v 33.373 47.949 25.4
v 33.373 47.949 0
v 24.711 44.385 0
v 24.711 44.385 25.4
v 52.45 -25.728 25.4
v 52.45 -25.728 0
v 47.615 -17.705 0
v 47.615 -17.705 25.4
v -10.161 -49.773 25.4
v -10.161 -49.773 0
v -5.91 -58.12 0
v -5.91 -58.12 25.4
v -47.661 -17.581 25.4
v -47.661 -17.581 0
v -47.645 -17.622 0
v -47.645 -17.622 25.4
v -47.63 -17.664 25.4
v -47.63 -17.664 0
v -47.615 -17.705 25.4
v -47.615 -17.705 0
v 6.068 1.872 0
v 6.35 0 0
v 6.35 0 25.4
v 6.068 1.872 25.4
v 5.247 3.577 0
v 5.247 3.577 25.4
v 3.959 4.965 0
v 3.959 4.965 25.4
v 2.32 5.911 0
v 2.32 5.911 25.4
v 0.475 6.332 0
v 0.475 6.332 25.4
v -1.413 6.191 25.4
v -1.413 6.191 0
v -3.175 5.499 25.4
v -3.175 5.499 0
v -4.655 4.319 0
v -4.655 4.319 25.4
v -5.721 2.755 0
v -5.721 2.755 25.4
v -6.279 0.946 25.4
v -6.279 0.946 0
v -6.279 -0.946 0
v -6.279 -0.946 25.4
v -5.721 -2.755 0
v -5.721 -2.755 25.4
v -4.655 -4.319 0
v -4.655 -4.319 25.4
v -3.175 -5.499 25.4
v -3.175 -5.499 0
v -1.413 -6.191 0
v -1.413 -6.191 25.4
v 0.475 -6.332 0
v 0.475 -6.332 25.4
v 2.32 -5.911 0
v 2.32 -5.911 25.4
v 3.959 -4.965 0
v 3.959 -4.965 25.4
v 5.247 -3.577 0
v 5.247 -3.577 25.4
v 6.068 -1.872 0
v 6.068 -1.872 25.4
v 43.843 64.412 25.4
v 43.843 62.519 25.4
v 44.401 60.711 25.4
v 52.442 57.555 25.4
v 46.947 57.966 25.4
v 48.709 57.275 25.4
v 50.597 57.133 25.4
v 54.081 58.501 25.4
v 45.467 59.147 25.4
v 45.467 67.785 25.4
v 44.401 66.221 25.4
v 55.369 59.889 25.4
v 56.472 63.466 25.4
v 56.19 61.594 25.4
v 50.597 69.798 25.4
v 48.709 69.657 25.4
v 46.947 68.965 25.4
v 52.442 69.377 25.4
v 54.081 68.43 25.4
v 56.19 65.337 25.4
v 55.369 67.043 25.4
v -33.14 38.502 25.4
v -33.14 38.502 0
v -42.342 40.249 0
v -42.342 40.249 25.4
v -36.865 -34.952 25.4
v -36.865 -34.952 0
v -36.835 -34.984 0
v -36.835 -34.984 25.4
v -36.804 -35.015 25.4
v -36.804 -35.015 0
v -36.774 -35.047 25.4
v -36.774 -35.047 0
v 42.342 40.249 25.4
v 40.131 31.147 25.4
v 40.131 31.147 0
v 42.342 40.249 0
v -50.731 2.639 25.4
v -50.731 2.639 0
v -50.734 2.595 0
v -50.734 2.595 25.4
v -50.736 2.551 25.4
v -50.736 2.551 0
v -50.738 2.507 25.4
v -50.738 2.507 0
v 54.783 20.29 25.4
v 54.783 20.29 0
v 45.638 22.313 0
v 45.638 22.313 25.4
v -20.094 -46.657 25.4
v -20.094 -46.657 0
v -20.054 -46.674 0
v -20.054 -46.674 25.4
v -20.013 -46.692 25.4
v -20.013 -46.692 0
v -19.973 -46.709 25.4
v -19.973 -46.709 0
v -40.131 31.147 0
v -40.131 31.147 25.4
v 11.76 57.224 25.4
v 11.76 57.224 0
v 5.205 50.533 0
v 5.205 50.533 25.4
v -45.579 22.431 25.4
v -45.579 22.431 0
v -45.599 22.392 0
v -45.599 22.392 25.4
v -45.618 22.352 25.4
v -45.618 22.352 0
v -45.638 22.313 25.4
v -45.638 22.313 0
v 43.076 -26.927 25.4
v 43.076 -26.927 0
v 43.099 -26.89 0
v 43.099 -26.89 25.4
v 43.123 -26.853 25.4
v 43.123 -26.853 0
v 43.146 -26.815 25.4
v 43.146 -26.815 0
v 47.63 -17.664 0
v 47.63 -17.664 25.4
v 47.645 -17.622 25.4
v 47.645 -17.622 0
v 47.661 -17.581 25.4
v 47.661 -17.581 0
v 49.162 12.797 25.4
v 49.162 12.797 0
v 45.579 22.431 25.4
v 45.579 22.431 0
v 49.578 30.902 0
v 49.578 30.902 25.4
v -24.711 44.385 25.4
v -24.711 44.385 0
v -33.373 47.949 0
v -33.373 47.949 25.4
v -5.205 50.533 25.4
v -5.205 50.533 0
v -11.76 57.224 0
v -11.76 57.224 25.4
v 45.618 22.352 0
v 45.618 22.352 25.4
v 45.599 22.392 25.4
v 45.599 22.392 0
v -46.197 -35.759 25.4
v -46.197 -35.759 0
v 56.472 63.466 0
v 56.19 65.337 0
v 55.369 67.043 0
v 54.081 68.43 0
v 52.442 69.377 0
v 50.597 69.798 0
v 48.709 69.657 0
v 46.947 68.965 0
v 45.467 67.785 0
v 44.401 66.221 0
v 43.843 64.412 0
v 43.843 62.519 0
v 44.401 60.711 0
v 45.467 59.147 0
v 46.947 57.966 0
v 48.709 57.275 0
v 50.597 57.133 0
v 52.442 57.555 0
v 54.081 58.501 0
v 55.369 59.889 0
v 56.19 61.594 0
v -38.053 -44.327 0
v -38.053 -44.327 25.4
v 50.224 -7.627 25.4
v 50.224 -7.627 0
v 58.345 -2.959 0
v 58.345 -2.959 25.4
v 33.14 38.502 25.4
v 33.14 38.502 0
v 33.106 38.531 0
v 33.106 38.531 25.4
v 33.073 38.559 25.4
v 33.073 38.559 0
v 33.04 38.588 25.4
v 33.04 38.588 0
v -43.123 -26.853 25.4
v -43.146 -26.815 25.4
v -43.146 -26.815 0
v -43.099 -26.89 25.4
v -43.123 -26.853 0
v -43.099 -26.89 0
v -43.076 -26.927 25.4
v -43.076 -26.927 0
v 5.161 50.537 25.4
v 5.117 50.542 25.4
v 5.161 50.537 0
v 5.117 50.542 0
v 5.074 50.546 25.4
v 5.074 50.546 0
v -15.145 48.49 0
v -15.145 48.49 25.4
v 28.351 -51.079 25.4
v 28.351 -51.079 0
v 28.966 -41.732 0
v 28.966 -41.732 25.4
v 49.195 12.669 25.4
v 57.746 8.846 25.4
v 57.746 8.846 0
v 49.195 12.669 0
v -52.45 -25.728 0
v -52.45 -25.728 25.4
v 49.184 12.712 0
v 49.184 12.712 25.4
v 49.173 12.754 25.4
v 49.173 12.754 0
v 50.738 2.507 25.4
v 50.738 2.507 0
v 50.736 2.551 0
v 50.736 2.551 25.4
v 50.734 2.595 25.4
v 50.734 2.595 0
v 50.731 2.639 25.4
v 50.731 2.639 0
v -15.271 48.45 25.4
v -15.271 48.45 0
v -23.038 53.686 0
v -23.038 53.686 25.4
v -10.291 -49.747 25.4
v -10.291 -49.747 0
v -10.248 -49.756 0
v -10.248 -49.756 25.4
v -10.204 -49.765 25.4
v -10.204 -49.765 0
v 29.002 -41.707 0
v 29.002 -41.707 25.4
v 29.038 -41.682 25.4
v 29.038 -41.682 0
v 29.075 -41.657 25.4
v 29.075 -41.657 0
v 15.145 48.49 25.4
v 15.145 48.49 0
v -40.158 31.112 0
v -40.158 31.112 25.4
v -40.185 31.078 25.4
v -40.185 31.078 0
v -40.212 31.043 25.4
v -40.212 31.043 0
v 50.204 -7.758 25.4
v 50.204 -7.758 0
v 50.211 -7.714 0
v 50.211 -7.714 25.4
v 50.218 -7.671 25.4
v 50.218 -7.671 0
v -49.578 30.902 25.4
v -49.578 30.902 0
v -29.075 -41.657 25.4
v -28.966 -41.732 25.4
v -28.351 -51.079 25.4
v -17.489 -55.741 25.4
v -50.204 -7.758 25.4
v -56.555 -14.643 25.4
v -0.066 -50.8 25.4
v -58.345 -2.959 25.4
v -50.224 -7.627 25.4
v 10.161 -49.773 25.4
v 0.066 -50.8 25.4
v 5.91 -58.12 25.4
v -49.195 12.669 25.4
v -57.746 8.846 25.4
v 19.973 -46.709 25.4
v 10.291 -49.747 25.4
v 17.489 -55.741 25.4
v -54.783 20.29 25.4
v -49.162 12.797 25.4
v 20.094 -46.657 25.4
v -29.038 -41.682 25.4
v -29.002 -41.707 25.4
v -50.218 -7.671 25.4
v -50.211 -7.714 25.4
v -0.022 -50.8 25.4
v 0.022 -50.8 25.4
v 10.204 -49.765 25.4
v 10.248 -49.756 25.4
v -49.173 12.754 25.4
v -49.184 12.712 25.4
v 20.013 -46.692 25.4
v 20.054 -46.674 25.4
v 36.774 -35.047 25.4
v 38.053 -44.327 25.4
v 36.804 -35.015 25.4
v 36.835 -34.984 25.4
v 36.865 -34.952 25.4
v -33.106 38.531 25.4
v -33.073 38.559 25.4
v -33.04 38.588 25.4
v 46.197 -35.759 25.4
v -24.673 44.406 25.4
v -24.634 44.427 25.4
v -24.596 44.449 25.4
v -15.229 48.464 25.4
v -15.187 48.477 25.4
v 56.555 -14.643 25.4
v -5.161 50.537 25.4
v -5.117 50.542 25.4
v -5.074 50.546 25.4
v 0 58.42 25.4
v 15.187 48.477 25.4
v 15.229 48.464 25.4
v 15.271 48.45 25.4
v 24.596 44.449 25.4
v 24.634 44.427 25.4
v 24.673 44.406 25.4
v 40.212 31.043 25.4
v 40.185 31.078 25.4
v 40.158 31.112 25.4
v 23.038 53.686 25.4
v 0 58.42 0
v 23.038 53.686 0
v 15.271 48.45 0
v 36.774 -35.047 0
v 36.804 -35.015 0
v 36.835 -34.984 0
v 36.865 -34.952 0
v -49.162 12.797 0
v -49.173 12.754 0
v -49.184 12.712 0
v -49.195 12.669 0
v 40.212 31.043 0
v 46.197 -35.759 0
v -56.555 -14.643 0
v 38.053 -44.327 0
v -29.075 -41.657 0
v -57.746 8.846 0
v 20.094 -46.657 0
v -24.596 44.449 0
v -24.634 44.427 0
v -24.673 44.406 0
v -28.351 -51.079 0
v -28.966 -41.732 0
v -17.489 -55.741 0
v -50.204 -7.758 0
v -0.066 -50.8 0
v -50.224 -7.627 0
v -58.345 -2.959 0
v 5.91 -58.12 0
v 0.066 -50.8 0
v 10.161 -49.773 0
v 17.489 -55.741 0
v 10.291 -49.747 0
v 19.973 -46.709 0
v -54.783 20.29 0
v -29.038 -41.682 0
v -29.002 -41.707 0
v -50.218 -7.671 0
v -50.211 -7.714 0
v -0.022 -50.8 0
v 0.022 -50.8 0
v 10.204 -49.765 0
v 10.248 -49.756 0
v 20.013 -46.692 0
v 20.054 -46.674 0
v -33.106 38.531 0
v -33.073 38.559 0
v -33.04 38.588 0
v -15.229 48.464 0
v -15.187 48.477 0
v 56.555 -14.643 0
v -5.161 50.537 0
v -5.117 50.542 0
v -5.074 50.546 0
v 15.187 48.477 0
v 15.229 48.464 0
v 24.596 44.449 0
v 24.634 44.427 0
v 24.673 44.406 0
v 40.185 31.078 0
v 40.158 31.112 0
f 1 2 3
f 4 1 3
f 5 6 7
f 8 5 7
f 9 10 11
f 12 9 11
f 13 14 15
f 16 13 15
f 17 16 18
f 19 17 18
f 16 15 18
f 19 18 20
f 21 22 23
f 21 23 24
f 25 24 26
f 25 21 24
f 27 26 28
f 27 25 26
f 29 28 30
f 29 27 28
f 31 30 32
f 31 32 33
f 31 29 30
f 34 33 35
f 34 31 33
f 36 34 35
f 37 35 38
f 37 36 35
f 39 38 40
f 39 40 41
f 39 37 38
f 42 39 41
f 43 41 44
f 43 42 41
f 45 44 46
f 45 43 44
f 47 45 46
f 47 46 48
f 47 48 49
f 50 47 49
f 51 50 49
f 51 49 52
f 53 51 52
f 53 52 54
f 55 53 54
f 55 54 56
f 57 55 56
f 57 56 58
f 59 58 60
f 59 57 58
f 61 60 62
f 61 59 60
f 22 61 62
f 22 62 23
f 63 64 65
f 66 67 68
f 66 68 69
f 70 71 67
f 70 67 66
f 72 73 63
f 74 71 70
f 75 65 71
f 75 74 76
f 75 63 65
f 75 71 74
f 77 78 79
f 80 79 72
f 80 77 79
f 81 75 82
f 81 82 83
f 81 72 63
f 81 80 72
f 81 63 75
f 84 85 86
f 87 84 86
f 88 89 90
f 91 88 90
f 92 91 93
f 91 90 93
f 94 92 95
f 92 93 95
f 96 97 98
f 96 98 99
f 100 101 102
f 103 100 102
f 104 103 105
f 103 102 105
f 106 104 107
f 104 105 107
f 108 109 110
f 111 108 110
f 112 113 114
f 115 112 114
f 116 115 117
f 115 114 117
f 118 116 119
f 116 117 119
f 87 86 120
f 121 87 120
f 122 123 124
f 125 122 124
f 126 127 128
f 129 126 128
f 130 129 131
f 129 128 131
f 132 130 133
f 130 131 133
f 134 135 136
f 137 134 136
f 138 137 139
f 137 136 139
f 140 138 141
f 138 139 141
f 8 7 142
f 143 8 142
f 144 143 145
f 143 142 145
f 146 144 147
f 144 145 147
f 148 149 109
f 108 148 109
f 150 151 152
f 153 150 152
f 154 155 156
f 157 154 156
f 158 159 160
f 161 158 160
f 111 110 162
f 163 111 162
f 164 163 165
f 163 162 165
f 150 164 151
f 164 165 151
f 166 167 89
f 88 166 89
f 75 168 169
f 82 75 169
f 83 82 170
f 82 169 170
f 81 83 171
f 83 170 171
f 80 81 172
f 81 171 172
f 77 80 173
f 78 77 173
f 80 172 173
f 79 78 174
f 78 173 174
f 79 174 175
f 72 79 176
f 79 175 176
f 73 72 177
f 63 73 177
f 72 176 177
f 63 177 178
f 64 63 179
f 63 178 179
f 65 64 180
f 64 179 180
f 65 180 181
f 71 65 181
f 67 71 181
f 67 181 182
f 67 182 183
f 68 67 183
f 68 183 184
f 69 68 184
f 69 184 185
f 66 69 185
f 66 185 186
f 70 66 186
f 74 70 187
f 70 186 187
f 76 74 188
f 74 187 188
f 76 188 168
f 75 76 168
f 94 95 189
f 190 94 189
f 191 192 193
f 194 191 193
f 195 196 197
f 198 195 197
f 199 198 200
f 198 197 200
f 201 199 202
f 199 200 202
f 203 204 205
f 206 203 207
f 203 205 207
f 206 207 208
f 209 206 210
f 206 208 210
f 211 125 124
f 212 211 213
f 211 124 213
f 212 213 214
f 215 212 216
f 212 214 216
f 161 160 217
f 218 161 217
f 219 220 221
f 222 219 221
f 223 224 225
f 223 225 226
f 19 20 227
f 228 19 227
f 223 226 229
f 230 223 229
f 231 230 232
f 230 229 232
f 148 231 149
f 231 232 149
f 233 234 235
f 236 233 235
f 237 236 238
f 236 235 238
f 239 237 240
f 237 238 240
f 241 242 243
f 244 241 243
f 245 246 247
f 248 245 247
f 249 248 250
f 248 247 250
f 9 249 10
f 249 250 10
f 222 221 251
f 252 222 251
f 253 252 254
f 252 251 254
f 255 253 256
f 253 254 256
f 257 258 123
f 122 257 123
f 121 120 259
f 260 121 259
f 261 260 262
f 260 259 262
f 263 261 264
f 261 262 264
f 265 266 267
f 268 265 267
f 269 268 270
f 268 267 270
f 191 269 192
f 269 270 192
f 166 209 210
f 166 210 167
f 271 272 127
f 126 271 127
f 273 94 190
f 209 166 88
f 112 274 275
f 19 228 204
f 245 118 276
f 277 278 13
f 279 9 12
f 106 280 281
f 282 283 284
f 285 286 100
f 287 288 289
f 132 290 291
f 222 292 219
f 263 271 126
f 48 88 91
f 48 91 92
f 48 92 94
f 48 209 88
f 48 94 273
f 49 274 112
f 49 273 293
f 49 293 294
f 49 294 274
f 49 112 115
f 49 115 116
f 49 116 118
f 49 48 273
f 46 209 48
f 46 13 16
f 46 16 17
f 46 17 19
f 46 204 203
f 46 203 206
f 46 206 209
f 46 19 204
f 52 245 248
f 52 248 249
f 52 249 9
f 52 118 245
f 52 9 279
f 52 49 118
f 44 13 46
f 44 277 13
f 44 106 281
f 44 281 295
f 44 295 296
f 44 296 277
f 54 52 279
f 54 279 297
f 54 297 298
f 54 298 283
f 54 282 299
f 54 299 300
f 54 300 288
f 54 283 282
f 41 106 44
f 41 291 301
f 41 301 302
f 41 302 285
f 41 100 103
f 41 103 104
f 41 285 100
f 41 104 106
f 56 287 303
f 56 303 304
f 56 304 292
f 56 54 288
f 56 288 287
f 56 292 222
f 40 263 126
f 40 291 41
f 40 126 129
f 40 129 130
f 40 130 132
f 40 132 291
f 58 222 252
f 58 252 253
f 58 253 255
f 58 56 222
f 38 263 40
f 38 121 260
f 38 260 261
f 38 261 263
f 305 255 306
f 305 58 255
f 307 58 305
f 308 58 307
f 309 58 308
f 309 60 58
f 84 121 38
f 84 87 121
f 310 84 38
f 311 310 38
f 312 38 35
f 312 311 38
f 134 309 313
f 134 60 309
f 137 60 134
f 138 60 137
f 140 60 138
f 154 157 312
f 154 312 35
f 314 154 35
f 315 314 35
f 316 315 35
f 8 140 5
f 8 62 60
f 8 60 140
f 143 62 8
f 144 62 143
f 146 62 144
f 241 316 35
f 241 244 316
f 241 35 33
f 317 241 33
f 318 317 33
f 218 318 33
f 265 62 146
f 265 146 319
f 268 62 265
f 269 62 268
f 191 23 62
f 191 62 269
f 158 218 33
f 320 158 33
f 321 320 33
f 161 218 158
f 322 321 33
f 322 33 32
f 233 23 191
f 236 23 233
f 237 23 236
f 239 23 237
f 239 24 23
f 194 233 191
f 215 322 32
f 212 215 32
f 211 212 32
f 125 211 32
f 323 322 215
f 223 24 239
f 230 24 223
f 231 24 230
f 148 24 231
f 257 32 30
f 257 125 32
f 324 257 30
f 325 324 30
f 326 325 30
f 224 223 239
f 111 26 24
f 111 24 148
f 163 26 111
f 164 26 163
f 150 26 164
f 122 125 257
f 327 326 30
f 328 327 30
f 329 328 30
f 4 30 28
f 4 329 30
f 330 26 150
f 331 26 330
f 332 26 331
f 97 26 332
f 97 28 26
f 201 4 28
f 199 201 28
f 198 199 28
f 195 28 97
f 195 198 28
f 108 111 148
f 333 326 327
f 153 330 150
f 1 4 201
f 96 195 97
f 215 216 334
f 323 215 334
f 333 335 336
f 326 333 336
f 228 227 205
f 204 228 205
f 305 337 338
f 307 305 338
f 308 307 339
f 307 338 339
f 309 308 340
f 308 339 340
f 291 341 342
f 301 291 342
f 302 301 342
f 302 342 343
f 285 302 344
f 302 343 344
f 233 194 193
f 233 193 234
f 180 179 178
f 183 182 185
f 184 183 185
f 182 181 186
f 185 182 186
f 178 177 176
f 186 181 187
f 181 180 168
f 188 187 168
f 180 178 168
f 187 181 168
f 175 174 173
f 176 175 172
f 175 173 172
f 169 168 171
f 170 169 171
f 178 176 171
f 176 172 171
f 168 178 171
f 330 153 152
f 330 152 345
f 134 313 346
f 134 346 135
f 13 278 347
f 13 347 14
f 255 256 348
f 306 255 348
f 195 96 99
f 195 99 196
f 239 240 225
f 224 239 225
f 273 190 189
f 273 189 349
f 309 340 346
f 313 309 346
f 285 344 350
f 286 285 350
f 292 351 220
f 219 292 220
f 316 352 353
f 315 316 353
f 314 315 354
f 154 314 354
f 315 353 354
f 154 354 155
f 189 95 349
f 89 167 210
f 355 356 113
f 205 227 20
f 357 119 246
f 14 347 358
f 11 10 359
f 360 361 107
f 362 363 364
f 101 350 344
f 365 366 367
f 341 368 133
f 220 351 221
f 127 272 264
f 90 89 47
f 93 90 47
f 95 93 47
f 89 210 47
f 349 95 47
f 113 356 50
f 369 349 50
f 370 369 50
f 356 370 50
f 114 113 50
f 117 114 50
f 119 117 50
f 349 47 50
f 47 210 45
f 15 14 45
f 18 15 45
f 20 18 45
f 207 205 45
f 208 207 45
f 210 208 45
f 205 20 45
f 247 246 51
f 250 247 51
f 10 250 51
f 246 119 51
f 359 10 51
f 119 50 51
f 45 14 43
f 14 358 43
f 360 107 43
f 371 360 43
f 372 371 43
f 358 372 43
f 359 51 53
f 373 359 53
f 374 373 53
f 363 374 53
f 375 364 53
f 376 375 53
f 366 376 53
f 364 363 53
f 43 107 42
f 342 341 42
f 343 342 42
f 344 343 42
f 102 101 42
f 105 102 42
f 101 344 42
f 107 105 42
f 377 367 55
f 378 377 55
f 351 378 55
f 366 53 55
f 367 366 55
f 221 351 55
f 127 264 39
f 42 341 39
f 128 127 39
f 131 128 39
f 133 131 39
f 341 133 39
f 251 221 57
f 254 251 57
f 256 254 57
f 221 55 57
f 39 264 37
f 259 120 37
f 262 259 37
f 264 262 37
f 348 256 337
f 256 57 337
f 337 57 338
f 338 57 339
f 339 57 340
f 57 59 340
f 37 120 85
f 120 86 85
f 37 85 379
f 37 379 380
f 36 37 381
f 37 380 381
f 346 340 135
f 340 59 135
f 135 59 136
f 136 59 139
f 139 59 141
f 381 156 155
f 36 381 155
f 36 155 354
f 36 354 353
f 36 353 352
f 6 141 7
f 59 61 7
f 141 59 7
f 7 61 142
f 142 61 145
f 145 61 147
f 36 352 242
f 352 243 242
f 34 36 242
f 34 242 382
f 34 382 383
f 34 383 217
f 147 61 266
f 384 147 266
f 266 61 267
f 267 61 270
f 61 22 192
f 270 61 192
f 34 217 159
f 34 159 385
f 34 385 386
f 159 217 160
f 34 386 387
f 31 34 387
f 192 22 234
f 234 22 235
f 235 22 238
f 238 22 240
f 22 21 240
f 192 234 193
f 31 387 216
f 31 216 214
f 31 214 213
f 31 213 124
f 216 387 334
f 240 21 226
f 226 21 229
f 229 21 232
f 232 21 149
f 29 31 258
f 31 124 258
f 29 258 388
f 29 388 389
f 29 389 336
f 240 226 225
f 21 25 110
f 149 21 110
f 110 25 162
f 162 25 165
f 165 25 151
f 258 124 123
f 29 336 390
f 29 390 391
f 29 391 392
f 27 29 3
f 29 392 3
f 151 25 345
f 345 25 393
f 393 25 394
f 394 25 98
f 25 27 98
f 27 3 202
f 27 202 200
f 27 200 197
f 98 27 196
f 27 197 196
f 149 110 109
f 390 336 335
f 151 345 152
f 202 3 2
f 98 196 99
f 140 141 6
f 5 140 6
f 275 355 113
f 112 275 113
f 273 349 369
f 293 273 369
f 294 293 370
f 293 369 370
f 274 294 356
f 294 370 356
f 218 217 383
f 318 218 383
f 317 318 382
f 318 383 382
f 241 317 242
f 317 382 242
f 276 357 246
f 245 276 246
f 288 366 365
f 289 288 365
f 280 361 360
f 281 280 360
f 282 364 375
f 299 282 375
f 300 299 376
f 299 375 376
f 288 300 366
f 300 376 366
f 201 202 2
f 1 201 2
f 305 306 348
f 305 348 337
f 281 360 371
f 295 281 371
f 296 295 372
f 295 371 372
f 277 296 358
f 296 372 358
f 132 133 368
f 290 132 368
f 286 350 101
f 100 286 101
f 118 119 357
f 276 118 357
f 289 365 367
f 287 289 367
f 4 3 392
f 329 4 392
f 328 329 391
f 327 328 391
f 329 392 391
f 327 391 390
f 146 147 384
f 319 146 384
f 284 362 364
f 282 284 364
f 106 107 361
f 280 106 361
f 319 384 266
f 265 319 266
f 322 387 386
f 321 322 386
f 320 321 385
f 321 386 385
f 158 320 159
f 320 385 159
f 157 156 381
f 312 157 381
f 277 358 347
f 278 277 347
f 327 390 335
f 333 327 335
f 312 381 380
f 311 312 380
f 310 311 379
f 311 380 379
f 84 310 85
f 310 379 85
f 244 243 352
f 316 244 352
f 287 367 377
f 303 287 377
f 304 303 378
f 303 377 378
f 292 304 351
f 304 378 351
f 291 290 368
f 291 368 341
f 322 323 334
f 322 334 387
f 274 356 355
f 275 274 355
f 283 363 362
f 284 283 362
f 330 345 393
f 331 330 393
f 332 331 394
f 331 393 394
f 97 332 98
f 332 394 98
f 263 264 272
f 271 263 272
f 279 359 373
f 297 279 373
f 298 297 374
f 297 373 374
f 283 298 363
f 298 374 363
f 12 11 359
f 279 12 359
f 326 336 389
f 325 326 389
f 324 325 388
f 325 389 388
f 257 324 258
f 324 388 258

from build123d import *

# Parameters (mm, degrees)
F0_R     = 6.35
F1_DEPTH = 25.4
F2_R     = 6.35
F3_DEPTH = 25.4


with BuildPart() as f1:
    # F0 (on Top) → F1 (new body)
    with BuildSketch(Plane.XY):
        with BuildLine():
            ThreePointArc((50.224149, -7.627247), (50.655833, -3.824477), (50.8, 0))
            ThreePointArc((50.8, 0), (50.784523, 1.253893), (50.738101, 2.507021))
            ThreePointArc((50.738101, 2.507021), (50.734799, 2.572978), (50.731411, 2.63893))
            ThreePointArc((50.731411, 2.63893), (50.214191, 7.692531), (49.194829, 12.669207))
            ThreePointArc((49.194829, 12.669207), (49.178318, 12.733149), (49.161723, 12.797069))
            ThreePointArc((49.161723, 12.797069), (47.637808, 17.643107), (45.637515, 22.312714))
            ThreePointArc((45.637515, 22.312714), (45.608471, 22.372023), (45.579349, 22.431294))
            ThreePointArc((45.579349, 22.431294), (43.111128, 26.871372), (40.211796, 31.042735))
            ThreePointArc((40.211796, 31.042735), (40.171407, 31.094984), (40.13095, 31.14718))
            ThreePointArc((40.13095, 31.14718), (36.819474, 34.999519), (33.139802, 38.501864))
            ThreePointArc((33.139802, 38.501864), (33.089722, 38.544913), (33.039586, 38.587896))
            ThreePointArc((33.039586, 38.587896), (29.020425, 41.694783), (24.71106, 44.384722))
            ThreePointArc((24.71106, 44.384722), (24.65334, 44.416808), (24.595578, 44.44882))
            ThreePointArc((24.595578, 44.44882), (20.033277, 46.683057), (15.270644, 48.450464))
            ThreePointArc((15.270644, 48.450464), (15.207647, 48.470274), (15.144623, 48.490003))
            ThreePointArc((15.144623, 48.490003), (10.225965, 49.760121), (5.205047, 50.532638))
            ThreePointArc((5.205047, 50.532638), (5.139351, 50.539362), (5.073646, 50.546))
            ThreePointArc((5.073646, 50.546), (2.54, 50.73646), (0, 50.8))
            ThreePointArc((0, 50.8), (-2.54, 50.73646), (-5.073646, 50.546))
            ThreePointArc((-5.073646, 50.546), (-5.139351, 50.539362), (-5.205047, 50.532638))
            ThreePointArc((-5.205047, 50.532638), (-10.225965, 49.760121), (-15.144623, 48.490003))
            ThreePointArc((-15.144623, 48.490003), (-15.207647, 48.470274), (-15.270644, 48.450464))
            ThreePointArc((-15.270644, 48.450464), (-20.033277, 46.683057), (-24.595578, 44.44882))
            ThreePointArc((-24.595578, 44.44882), (-24.65334, 44.416808), (-24.71106, 44.384722))
            ThreePointArc((-24.71106, 44.384722), (-29.020425, 41.694783), (-33.039586, 38.587896))
            ThreePointArc((-33.039586, 38.587896), (-33.089722, 38.544913), (-33.139802, 38.501864))
            ThreePointArc((-33.139802, 38.501864), (-36.819474, 34.999519), (-40.13095, 31.14718))
            ThreePointArc((-40.13095, 31.14718), (-40.171407, 31.094984), (-40.211796, 31.042735))
            ThreePointArc((-40.211796, 31.042735), (-43.111128, 26.871372), (-45.579349, 22.431294))
            ThreePointArc((-45.579349, 22.431294), (-45.608471, 22.372023), (-45.637515, 22.312714))
            ThreePointArc((-45.637515, 22.312714), (-47.637808, 17.643107), (-49.161723, 12.797069))
            ThreePointArc((-49.161723, 12.797069), (-49.178318, 12.733149), (-49.194829, 12.669207))
            ThreePointArc((-49.194829, 12.669207), (-50.214191, 7.692531), (-50.731411, 2.63893))
            ThreePointArc((-50.731411, 2.63893), (-50.734799, 2.572978), (-50.738101, 2.507021))
            ThreePointArc((-50.738101, 2.507021), (-50.734799, -2.572978), (-50.224149, -7.627247))
            ThreePointArc((-50.224149, -7.627247), (-50.214191, -7.692531), (-50.204148, -7.757802))
            ThreePointArc((-50.204148, -7.757802), (-49.178318, -12.733149), (-47.660704, -17.581164))
            ThreePointArc((-47.660704, -17.581164), (-47.637808, -17.643107), (-47.614832, -17.70502))
            ThreePointArc((-47.614832, -17.70502), (-45.608471, -22.372023), (-43.146024, -26.815305))
            ThreePointArc((-43.146024, -26.815305), (-43.111128, -26.871372), (-43.076159, -26.927393))
            ThreePointArc((-43.076159, -26.927393), (-40.171407, -31.094984), (-36.864941, -34.951625))
            ThreePointArc((-36.864941, -34.951625), (-36.819474, -34.999519), (-36.773944, -35.047355))
            ThreePointArc((-36.773944, -35.047355), (-33.089722, -38.544913), (-29.074603, -41.657021))
            ThreePointArc((-29.074603, -41.657021), (-29.020425, -41.694783), (-28.966198, -41.732474))
            ThreePointArc((-28.966198, -41.732474), (-24.65334, -44.416808), (-20.093948, -46.656974))
            ThreePointArc((-20.093948, -46.656974), (-20.033277, -46.683057), (-19.972573, -46.70906))
            ThreePointArc((-19.972573, -46.70906), (-15.207647, -48.470274), (-10.290644, -49.746785))
            ThreePointArc((-10.290644, -49.746785), (-10.225965, -49.760121), (-10.161269, -49.773373))
            ThreePointArc((-10.161269, -49.773373), (-5.139351, -50.539362), (-0.066039, -50.799957))
            ThreePointArc((-0.066039, -50.799957), (0, -50.8), (0.066039, -50.799957))
            ThreePointArc((0.066039, -50.799957), (5.139351, -50.539362), (10.161269, -49.773373))
            ThreePointArc((10.161269, -49.773373), (10.225965, -49.760121), (10.290644, -49.746785))
            ThreePointArc((10.290644, -49.746785), (15.207647, -48.470274), (19.972573, -46.70906))
            ThreePointArc((19.972573, -46.70906), (20.033277, -46.683057), (20.093948, -46.656974))
            ThreePointArc((20.093948, -46.656974), (24.65334, -44.416808), (28.966198, -41.732474))
            ThreePointArc((28.966198, -41.732474), (29.020425, -41.694783), (29.074603, -41.657021))
            ThreePointArc((29.074603, -41.657021), (33.089722, -38.544913), (36.773944, -35.047355))
            ThreePointArc((36.773944, -35.047355), (36.819474, -34.999519), (36.864941, -34.951625))
            ThreePointArc((36.864941, -34.951625), (40.171407, -31.094984), (43.076159, -26.927393))
            ThreePointArc((43.076159, -26.927393), (43.111128, -26.871372), (43.146024, -26.815305))
            ThreePointArc((43.146024, -26.815305), (45.608471, -22.372023), (47.614832, -17.70502))
            ThreePointArc((47.614832, -17.70502), (47.637808, -17.643107), (47.660704, -17.581164))
            ThreePointArc((47.660704, -17.581164), (49.178318, -12.733149), (50.204148, -7.757802))
            ThreePointArc((50.204148, -7.757802), (50.214191, -7.692531), (50.224149, -7.627247))
        make_face()
        Circle(F0_R, mode=Mode.SUBTRACT)
        with BuildLine():
            ThreePointArc((50.738101, 2.507021), (50.784523, 1.253893), (50.8, 0))
            ThreePointArc((50.8, 0), (50.655833, -3.824477), (50.224149, -7.627247))
            Line((50.224149, -7.627247), (58.345018, -2.958924))
            Line((58.345018, -2.958924), (50.738101, 2.507021))
        make_face()
        with BuildLine():
            ThreePointArc((49.194829, 12.669207), (50.214191, 7.692531), (50.731411, 2.63893))
            Line((50.731411, 2.63893), (57.74632, 8.846411))
            Line((57.74632, 8.846411), (49.194829, 12.669207))
        make_face()
        with BuildLine():
            Line((56.555065, -14.643121), (50.204148, -7.757802))
            ThreePointArc((50.204148, -7.757802), (49.178318, -12.733149), (47.660704, -17.581164))
            Line((47.660704, -17.581164), (56.555065, -14.643121))
        make_face()
        with BuildLine():
            ThreePointArc((45.637515, 22.312714), (47.637808, 17.643107), (49.161723, 12.797069))
            Line((49.161723, 12.797069), (54.78348, 20.289573))
            Line((54.78348, 20.289573), (45.637515, 22.312714))
        make_face()
        with BuildLine():
            Line((52.449741, -25.727826), (47.614832, -17.70502))
            ThreePointArc((47.614832, -17.70502), (45.608471, -22.372023), (43.146024, -26.815305))
            Line((43.146024, -26.815305), (52.449741, -25.727826))
        make_face()
        with BuildLine():
            ThreePointArc((40.211796, 31.042735), (43.111128, 26.871372), (45.579349, 22.431294))
            Line((45.579349, 22.431294), (49.577798, 30.902077))
            Line((49.577798, 30.902077), (40.211796, 31.042735))
        make_face()
        with BuildLine():
            Line((46.197119, -35.759232), (43.076159, -26.927393))
            ThreePointArc((43.076159, -26.927393), (40.171407, -31.094984), (36.864941, -34.951625))
            Line((36.864941, -34.951625), (46.197119, -35.759232))
        make_face()
        with BuildLine():
            ThreePointArc((33.139802, 38.501864), (36.819474, 34.999519), (40.13095, 31.14718))
            Line((40.13095, 31.14718), (42.342395, 40.249447))
            Line((42.342395, 40.249447), (33.139802, 38.501864))
        make_face()
        with BuildLine():
            Line((38.05318, -44.32665), (36.773944, -35.047355))
            ThreePointArc((36.773944, -35.047355), (33.089722, -38.544913), (29.074603, -41.657021))
            Line((29.074603, -41.657021), (38.05318, -44.32665))
        make_face()
        with BuildLine():
            ThreePointArc((24.71106, 44.384722), (29.020425, 41.694783), (33.039586, 38.587896))
            Line((33.039586, 38.587896), (33.373489, 47.949))
            Line((33.373489, 47.949), (24.71106, 44.384722))
        make_face()
        with BuildLine():
            Line((28.351341, -51.079329), (28.966198, -41.732474))
            ThreePointArc((28.966198, -41.732474), (24.65334, -44.416808), (20.093948, -46.656974))
            Line((20.093948, -46.656974), (28.351341, -51.079329))
        make_face()
        with BuildLine():
            ThreePointArc((15.270644, 48.450464), (20.033277, 46.683057), (24.595578, 44.44882))
            Line((24.595578, 44.44882), (23.038269, 53.685515))
            Line((23.038269, 53.685515), (15.270644, 48.450464))
        make_face()
        with BuildLine():
            Line((17.488794, -55.740815), (19.972573, -46.70906))
            ThreePointArc((19.972573, -46.70906), (15.207647, -48.470274), (10.290644, -49.746785))
            Line((10.290644, -49.746785), (17.488794, -55.740815))
        make_face()
        with BuildLine():
            ThreePointArc((5.205047, 50.532638), (10.225965, 49.760121), (15.144623, 48.490003))
            Line((15.144623, 48.490003), (11.75986, 57.224139))
            Line((11.75986, 57.224139), (5.205047, 50.532638))
        make_face()
        with BuildLine():
            Line((5.910253, -58.120266), (10.161269, -49.773373))
            ThreePointArc((10.161269, -49.773373), (5.139351, -50.539362), (0.066039, -50.799957))
            Line((0.066039, -50.799957), (5.910253, -58.120266))
        make_face()
        with BuildLine():
            ThreePointArc((0, 50.8), (2.54, 50.73646), (5.073646, 50.546))
            Line((5.073646, 50.546), (0, 58.42))
            Line((0, 58.42), (0, 50.8))
        make_face()
        with BuildLine():
            Line((-5.910253, -58.120266), (-0.066039, -50.799957))
            ThreePointArc((-0.066039, -50.799957), (-5.139351, -50.539362), (-10.161269, -49.773373))
            Line((-10.161269, -49.773373), (-5.910253, -58.120266))
        make_face()
        with BuildLine():
            ThreePointArc((-5.073646, 50.546), (-2.54, 50.73646), (0, 50.8))
            Line((0, 50.8), (0, 58.42))
            Line((0, 58.42), (-5.073646, 50.546))
        make_face()
        with BuildLine():
            Line((-17.488794, -55.740815), (-10.290644, -49.746785))
            ThreePointArc((-10.290644, -49.746785), (-15.207647, -48.470274), (-19.972573, -46.70906))
            Line((-19.972573, -46.70906), (-17.488794, -55.740815))
        make_face()
        with BuildLine():
            ThreePointArc((-15.144623, 48.490003), (-10.225965, 49.760121), (-5.205047, 50.532638))
            Line((-5.205047, 50.532638), (-11.75986, 57.224139))
            Line((-11.75986, 57.224139), (-15.144623, 48.490003))
        make_face()
        with BuildLine():
            Line((-28.351341, -51.079329), (-20.093948, -46.656974))
            ThreePointArc((-20.093948, -46.656974), (-24.65334, -44.416808), (-28.966198, -41.732474))
            Line((-28.966198, -41.732474), (-28.351341, -51.079329))
        make_face()
        with BuildLine():
            ThreePointArc((-24.595578, 44.44882), (-20.033277, 46.683057), (-15.270644, 48.450464))
            Line((-15.270644, 48.450464), (-23.038269, 53.685515))
            Line((-23.038269, 53.685515), (-24.595578, 44.44882))
        make_face()
        with BuildLine():
            Line((-38.05318, -44.32665), (-29.074603, -41.657021))
            ThreePointArc((-29.074603, -41.657021), (-33.089722, -38.544913), (-36.773944, -35.047355))
            Line((-36.773944, -35.047355), (-38.05318, -44.32665))
        make_face()
        with BuildLine():
            ThreePointArc((-33.039586, 38.587896), (-29.020425, 41.694783), (-24.71106, 44.384722))
            Line((-24.71106, 44.384722), (-33.373489, 47.949))
            Line((-33.373489, 47.949), (-33.039586, 38.587896))
        make_face()
        with BuildLine():
            Line((-46.197119, -35.759232), (-36.864941, -34.951625))
            ThreePointArc((-36.864941, -34.951625), (-40.171407, -31.094984), (-43.076159, -26.927393))
            Line((-43.076159, -26.927393), (-46.197119, -35.759232))
        make_face()
        with BuildLine():
            ThreePointArc((-40.13095, 31.14718), (-36.819474, 34.999519), (-33.139802, 38.501864))
            Line((-33.139802, 38.501864), (-42.342395, 40.249447))
            Line((-42.342395, 40.249447), (-40.13095, 31.14718))
        make_face()
        with BuildLine():
            Line((-52.449741, -25.727826), (-43.146024, -26.815305))
            ThreePointArc((-43.146024, -26.815305), (-45.608471, -22.372023), (-47.614832, -17.70502))
            Line((-47.614832, -17.70502), (-52.449741, -25.727826))
        make_face()
        with BuildLine():
            ThreePointArc((-45.579349, 22.431294), (-43.111128, 26.871372), (-40.211796, 31.042735))
            Line((-40.211796, 31.042735), (-49.577798, 30.902077))
            Line((-49.577798, 30.902077), (-45.579349, 22.431294))
        make_face()
        with BuildLine():
            Line((-56.555065, -14.643121), (-47.660704, -17.581164))
            ThreePointArc((-47.660704, -17.581164), (-49.178318, -12.733149), (-50.204148, -7.757802))
            Line((-50.204148, -7.757802), (-56.555065, -14.643121))
        make_face()
        with BuildLine():
            ThreePointArc((-49.161723, 12.797069), (-47.637808, 17.643107), (-45.637515, 22.312714))
            Line((-45.637515, 22.312714), (-54.78348, 20.289573))
            Line((-54.78348, 20.289573), (-49.161723, 12.797069))
        make_face()
        with BuildLine():
            Line((-58.345018, -2.958924), (-50.224149, -7.627247))
            ThreePointArc((-50.224149, -7.627247), (-50.734799, -2.572978), (-50.738101, 2.507021))
            Line((-50.738101, 2.507021), (-58.345018, -2.958924))
        make_face()
        with BuildLine():
            ThreePointArc((-50.731411, 2.63893), (-50.214191, 7.692531), (-49.194829, 12.669207))
            Line((-49.194829, 12.669207), (-57.74632, 8.846411))
            Line((-57.74632, 8.846411), (-50.731411, 2.63893))
        make_face()
    extrude(amount=F1_DEPTH)


with BuildPart() as f3:
    # F2 (on Top) → F3 (new body)
    with BuildSketch(Plane.XY):
        with Locations((50.122309, 63.465722)):
            Circle(F2_R)
    extrude(amount=F3_DEPTH)


solid = Compound([f1.part, f3.part])
